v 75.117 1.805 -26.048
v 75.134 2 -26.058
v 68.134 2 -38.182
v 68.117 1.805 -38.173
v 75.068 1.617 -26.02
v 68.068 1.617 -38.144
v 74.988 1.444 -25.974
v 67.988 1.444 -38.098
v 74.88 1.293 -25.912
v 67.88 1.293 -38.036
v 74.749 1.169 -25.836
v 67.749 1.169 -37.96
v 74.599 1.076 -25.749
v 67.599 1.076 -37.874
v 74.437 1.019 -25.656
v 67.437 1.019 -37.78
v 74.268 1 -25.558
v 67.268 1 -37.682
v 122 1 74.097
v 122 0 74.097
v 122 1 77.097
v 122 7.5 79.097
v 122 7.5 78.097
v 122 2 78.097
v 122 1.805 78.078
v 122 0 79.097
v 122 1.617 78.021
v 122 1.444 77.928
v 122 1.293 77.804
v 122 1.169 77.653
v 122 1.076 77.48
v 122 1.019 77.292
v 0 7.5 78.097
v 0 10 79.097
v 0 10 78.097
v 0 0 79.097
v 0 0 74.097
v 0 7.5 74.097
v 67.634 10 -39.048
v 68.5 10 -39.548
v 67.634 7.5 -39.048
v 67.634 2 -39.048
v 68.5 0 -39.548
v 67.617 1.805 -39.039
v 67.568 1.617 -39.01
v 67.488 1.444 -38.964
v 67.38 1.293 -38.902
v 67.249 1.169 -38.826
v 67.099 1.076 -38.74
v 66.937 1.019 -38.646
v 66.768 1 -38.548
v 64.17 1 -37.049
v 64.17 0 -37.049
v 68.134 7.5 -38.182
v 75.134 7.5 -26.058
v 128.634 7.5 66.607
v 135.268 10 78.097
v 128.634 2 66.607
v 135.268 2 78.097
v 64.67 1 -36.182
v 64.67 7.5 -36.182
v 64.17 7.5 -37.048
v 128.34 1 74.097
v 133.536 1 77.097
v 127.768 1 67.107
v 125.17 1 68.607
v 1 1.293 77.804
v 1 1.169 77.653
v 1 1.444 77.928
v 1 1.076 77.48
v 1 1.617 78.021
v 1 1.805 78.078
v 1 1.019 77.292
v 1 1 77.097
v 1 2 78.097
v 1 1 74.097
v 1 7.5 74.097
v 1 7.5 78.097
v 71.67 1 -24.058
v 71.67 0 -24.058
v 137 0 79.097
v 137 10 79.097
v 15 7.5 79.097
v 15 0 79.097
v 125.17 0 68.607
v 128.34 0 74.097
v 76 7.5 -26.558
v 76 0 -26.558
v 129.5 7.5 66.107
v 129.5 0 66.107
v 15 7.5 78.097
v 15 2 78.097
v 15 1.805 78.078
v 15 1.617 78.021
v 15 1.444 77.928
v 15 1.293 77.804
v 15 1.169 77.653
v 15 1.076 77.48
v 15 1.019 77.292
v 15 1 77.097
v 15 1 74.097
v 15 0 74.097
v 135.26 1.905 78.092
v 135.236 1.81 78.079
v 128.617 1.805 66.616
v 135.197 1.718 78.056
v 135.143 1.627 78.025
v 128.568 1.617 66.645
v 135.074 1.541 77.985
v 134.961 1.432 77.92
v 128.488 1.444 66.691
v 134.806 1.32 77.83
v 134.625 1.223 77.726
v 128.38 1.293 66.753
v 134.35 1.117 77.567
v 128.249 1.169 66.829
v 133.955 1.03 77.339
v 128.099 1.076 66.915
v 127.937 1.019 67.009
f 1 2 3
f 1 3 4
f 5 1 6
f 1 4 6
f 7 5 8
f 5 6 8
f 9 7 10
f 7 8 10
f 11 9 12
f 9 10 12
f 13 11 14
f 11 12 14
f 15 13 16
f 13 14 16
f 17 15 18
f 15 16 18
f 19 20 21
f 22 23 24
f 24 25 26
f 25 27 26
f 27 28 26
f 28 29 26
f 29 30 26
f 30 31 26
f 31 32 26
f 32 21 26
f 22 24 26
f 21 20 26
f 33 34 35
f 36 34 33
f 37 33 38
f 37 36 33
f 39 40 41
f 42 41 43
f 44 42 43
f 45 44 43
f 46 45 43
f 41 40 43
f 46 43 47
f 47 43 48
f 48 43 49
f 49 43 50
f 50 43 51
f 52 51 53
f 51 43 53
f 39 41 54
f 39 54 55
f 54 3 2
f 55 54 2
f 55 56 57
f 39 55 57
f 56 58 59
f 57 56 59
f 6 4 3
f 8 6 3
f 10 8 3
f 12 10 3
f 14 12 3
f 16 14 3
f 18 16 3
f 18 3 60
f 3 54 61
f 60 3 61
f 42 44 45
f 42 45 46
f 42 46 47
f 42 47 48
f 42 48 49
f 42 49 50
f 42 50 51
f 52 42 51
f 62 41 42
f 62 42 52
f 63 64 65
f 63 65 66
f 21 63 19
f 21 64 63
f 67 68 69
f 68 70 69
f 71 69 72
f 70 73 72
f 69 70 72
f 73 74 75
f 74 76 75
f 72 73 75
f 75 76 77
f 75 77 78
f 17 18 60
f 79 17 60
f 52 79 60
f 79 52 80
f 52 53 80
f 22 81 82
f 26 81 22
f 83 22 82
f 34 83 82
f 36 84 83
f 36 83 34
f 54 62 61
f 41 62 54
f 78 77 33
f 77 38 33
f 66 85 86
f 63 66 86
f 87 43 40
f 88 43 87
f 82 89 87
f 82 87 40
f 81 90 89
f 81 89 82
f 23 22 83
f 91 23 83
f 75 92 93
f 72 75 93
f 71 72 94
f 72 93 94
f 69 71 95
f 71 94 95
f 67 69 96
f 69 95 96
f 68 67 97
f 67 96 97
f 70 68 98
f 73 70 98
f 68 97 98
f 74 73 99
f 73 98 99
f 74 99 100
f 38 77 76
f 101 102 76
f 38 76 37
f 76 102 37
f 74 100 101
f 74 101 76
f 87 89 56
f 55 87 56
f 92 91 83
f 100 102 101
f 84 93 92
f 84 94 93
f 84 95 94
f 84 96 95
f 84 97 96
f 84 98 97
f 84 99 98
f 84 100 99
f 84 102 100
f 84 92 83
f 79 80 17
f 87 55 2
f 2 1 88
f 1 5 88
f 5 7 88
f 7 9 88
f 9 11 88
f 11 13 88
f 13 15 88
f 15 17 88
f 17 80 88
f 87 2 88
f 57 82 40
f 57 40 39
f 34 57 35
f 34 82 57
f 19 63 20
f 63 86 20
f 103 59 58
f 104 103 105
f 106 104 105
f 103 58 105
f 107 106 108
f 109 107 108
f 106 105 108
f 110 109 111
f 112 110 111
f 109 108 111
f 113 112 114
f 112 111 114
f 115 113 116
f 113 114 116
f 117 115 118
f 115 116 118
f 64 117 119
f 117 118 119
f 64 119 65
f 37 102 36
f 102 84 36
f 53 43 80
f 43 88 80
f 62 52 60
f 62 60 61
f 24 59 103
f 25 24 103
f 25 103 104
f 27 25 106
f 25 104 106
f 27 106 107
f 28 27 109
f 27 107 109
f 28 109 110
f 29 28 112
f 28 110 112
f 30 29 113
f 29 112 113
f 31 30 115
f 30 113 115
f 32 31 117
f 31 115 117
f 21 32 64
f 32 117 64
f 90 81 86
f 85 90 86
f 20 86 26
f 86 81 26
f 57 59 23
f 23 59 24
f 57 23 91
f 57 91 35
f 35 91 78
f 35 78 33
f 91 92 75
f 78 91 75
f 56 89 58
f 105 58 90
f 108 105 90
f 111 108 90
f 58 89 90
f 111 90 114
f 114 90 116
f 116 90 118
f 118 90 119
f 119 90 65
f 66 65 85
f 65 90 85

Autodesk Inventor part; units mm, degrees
ref_plane "YZ Plane" through (0, 0, 0) normal (1, 0, 0) x (0, 1, 0)
ref_plane "XZ Plane" through (0, 0, 0) normal (0, 1, 0) x (-1, 0, 0)
ref_plane "XY Plane" through (0, 0, 0) normal (0, 0, 1) x (1, 0, 0)
sketch "Sketch2" plane through (0, 0, 0) normal (0, 1, 0) x (-1, 0, 0)
  line L0 (0, -158.194) -> (-137, 79.097)
  line L1 (-137, 79.097) -> (137, 79.097)
  line L2 (137, 79.097) -> (0, -158.194)
  line L3 (0, -156.194) -> (-135.2679, 78.097)
  line L4 (-135.2679, 78.097) -> (135.2679, 78.097)
  line L5 (135.2679, 78.097) -> (0, -156.194)
  line L6 (0, -148.194) -> (-128.3397, 74.097)
  line L7 (-128.3397, 74.097) -> (128.3397, 74.097)
  line L8 (128.3397, 74.097) -> (0, -148.194)
  line L9 (0, 0) -> (0, -202.1847)
  line L10 (122, 72.7976) -> (-122, 72.7976)
  line L11 (-122, 72.7976) -> (-122, 81.133)
  line L12 (-122, 81.133) -> (122, 81.133)
  line L13 (122, 81.133) -> (122, 72.7976)
  line L14 (0, 72.7976) -> (0, 81.133)
  line L15 (-15, 72.7976) -> (-15, 81.133)
  line L16 (15, 72.7976) -> (15, 81.133)
  line L17 (-124.0446, 69.2563) -> (-2.0446, -142.0539)
  line L18 (-2.0446, -142.0539) -> (-9.2633, -146.2216)
  line L19 (-9.2633, -146.2216) -> (-131.2633, 65.0886)
  line L20 (-131.2633, 65.0886) -> (-124.0446, 69.2563)
  line L21 (-63.0446, -36.3988) -> (-70.2633, -40.5665)
  line L22 (-55.5446, -49.3892) -> (-62.7633, -53.5569)
  line L23 (-70.5446, -23.4084) -> (-77.7633, -27.5761)
  line L24 (2.0446, -142.0539) -> (124.0446, 69.2563)
  line L25 (124.0446, 69.2563) -> (131.2633, 65.0886)
  line L26 (131.2633, 65.0886) -> (9.2633, -146.2216)
  line L27 (9.2633, -146.2216) -> (2.0446, -142.0539)
  line L28 (63.0446, -36.3988) -> (70.2633, -40.5665)
  line L29 (70.5446, -23.4084) -> (77.7633, -27.5761)
  line L30 (55.5446, -49.3892) -> (62.7633, -53.5569)
  dimension "d34" = 1
  dimension "d35" = 5
  dimension "d36" = 274
  dimension "d37" = 0
  dimension "d51" = 15
  dimension "d52" = 15
  dimension "d53" = 15
  dimension "d54" = 30
  dimension "d57" = 360
extrude "Extrusion7" add sketch "Sketch2" along normal blind 10 contours L9 L5 L27 L2 | L0 L18 L3 L9 | L0 L22 L3 L18 | L27 L5 L30 L2 | L0 L21 L3 L22 | L30 L5 L28 L2 | L0 L23 L3 L21 | L28 L5 L29 L2 | L0 L20 L3 L23 | L29 L5 L25 L2 | L0 L1 L11 L4 L3 L20 | L25 L5 L4 L13 L1 L2 | L1 L15 L4 L11 | L13 L4 L16 L1 | L1 L14 L4 L15 | L16 L4 L14 L1
extrude "Extrusion8" add sketch "Sketch2" along normal blind 1 contours L9 L8 L27 L5 | L3 L18 L6 L9 | L3 L22 L6 L18 | L27 L8 L30 L5 | L3 L21 L6 L22 | L30 L8 L28 L5 | L3 L23 L6 L21 | L28 L8 L29 L5 | L3 L20 L6 L23 | L29 L8 L25 L5 | L3 L4 L11 L7 L6 L20 | L25 L8 L7 L13 L4 L5 | L4 L15 L7 L11 | L13 L7 L16 L4 | L4 L14 L7 L15 | L16 L7 L14 L4
fillet "Fillet3" radius 1 3 edges at (-67.634, 1, -39.0485) (67.634, 1, -39.0485) (0, 1, 78.097)
extrude "Extrusion10" cut sketch "Sketch2" along normal blind 7.5 contours L18 L19 L22 L0 | L0 L22 L3 L18 | L27 L5 L30 L2 | L2 L30 L26 L27 | L3 L22 L6 L18 | L27 L8 L30 L5 | L6 L22 L17 L18 | L27 L24 L30 L8 | L23 L19 L20 L0 | L0 L20 L3 L23 | L29 L5 L25 L2 | L2 L25 L26 L29 | L3 L20 L6 L23 | L29 L8 L25 L5 | L6 L20 L17 L23 | L29 L24 L25 L8 | L11 L12 L15 L1 | L1 L15 L4 L11 | L13 L4 L16 L1 | L1 L16 L12 L13 | L4 L15 L7 L11 | L13 L7 L16 L4 | L7 L15 L10 L11 | L13 L10 L16 L7
sketch "Sketch3" plane through (0, 0, 0) normal (0, -1, 0) x (1, 0, 0)
  line L0 (177.2057, 67.9092) -> (177.2057, 204.1642)
  line L1 (177.2057, 204.1642) -> (0, 204.1642)
  line L2 (0, 204.1642) -> (0, 67.9092)
  line L3 (61, -52.5389) -> (76, -26.5581) projected
  line L4 (68.5, -39.5485) -> (60.9094, -35.1661)
  line L5 (60.9094, -35.1661) -> (0, 67.9092)
  line L6 (68.5, -39.5485) -> (177.2057, 67.9092)
  point P0 (0, 0)
extrude "Extrusion11" cut sketch "Sketch3" against normal blind 1000 keep common part
sketch "Sketch4" plane through (0, 0, 74.097) normal (-1, 0, 0) x (0, 0, 1)
  line L0 (5, 0) -> (0, 0)
  line L1 (0, 0) -> (0, 7.5)
  line L2 (0, 7.5) -> (5, 7.5)
  line L3 (5, 7.5) -> (5, 0)
  point P0 (-74.097, 0)
extrude "Extrusion12" add sketch "Sketch4" against normal blind 1
sketch "Sketch5" plane through (68.5, 0, -39.5485) normal (-0.5, 0, -0.866) x (-0.866, 0, 0.5)
  line L0 (0, 0) -> (5, 0)
  line L1 (5, 0) -> (5, 7.5)
  line L2 (5, 7.5) -> (0, 7.5)
  line L3 (0, 7.5) -> (0, 0)
  point P0 (79.097, 0)
extrude "Extrusion13" add sketch "Sketch5" against normal blind 1
properties part number "Triangle"
